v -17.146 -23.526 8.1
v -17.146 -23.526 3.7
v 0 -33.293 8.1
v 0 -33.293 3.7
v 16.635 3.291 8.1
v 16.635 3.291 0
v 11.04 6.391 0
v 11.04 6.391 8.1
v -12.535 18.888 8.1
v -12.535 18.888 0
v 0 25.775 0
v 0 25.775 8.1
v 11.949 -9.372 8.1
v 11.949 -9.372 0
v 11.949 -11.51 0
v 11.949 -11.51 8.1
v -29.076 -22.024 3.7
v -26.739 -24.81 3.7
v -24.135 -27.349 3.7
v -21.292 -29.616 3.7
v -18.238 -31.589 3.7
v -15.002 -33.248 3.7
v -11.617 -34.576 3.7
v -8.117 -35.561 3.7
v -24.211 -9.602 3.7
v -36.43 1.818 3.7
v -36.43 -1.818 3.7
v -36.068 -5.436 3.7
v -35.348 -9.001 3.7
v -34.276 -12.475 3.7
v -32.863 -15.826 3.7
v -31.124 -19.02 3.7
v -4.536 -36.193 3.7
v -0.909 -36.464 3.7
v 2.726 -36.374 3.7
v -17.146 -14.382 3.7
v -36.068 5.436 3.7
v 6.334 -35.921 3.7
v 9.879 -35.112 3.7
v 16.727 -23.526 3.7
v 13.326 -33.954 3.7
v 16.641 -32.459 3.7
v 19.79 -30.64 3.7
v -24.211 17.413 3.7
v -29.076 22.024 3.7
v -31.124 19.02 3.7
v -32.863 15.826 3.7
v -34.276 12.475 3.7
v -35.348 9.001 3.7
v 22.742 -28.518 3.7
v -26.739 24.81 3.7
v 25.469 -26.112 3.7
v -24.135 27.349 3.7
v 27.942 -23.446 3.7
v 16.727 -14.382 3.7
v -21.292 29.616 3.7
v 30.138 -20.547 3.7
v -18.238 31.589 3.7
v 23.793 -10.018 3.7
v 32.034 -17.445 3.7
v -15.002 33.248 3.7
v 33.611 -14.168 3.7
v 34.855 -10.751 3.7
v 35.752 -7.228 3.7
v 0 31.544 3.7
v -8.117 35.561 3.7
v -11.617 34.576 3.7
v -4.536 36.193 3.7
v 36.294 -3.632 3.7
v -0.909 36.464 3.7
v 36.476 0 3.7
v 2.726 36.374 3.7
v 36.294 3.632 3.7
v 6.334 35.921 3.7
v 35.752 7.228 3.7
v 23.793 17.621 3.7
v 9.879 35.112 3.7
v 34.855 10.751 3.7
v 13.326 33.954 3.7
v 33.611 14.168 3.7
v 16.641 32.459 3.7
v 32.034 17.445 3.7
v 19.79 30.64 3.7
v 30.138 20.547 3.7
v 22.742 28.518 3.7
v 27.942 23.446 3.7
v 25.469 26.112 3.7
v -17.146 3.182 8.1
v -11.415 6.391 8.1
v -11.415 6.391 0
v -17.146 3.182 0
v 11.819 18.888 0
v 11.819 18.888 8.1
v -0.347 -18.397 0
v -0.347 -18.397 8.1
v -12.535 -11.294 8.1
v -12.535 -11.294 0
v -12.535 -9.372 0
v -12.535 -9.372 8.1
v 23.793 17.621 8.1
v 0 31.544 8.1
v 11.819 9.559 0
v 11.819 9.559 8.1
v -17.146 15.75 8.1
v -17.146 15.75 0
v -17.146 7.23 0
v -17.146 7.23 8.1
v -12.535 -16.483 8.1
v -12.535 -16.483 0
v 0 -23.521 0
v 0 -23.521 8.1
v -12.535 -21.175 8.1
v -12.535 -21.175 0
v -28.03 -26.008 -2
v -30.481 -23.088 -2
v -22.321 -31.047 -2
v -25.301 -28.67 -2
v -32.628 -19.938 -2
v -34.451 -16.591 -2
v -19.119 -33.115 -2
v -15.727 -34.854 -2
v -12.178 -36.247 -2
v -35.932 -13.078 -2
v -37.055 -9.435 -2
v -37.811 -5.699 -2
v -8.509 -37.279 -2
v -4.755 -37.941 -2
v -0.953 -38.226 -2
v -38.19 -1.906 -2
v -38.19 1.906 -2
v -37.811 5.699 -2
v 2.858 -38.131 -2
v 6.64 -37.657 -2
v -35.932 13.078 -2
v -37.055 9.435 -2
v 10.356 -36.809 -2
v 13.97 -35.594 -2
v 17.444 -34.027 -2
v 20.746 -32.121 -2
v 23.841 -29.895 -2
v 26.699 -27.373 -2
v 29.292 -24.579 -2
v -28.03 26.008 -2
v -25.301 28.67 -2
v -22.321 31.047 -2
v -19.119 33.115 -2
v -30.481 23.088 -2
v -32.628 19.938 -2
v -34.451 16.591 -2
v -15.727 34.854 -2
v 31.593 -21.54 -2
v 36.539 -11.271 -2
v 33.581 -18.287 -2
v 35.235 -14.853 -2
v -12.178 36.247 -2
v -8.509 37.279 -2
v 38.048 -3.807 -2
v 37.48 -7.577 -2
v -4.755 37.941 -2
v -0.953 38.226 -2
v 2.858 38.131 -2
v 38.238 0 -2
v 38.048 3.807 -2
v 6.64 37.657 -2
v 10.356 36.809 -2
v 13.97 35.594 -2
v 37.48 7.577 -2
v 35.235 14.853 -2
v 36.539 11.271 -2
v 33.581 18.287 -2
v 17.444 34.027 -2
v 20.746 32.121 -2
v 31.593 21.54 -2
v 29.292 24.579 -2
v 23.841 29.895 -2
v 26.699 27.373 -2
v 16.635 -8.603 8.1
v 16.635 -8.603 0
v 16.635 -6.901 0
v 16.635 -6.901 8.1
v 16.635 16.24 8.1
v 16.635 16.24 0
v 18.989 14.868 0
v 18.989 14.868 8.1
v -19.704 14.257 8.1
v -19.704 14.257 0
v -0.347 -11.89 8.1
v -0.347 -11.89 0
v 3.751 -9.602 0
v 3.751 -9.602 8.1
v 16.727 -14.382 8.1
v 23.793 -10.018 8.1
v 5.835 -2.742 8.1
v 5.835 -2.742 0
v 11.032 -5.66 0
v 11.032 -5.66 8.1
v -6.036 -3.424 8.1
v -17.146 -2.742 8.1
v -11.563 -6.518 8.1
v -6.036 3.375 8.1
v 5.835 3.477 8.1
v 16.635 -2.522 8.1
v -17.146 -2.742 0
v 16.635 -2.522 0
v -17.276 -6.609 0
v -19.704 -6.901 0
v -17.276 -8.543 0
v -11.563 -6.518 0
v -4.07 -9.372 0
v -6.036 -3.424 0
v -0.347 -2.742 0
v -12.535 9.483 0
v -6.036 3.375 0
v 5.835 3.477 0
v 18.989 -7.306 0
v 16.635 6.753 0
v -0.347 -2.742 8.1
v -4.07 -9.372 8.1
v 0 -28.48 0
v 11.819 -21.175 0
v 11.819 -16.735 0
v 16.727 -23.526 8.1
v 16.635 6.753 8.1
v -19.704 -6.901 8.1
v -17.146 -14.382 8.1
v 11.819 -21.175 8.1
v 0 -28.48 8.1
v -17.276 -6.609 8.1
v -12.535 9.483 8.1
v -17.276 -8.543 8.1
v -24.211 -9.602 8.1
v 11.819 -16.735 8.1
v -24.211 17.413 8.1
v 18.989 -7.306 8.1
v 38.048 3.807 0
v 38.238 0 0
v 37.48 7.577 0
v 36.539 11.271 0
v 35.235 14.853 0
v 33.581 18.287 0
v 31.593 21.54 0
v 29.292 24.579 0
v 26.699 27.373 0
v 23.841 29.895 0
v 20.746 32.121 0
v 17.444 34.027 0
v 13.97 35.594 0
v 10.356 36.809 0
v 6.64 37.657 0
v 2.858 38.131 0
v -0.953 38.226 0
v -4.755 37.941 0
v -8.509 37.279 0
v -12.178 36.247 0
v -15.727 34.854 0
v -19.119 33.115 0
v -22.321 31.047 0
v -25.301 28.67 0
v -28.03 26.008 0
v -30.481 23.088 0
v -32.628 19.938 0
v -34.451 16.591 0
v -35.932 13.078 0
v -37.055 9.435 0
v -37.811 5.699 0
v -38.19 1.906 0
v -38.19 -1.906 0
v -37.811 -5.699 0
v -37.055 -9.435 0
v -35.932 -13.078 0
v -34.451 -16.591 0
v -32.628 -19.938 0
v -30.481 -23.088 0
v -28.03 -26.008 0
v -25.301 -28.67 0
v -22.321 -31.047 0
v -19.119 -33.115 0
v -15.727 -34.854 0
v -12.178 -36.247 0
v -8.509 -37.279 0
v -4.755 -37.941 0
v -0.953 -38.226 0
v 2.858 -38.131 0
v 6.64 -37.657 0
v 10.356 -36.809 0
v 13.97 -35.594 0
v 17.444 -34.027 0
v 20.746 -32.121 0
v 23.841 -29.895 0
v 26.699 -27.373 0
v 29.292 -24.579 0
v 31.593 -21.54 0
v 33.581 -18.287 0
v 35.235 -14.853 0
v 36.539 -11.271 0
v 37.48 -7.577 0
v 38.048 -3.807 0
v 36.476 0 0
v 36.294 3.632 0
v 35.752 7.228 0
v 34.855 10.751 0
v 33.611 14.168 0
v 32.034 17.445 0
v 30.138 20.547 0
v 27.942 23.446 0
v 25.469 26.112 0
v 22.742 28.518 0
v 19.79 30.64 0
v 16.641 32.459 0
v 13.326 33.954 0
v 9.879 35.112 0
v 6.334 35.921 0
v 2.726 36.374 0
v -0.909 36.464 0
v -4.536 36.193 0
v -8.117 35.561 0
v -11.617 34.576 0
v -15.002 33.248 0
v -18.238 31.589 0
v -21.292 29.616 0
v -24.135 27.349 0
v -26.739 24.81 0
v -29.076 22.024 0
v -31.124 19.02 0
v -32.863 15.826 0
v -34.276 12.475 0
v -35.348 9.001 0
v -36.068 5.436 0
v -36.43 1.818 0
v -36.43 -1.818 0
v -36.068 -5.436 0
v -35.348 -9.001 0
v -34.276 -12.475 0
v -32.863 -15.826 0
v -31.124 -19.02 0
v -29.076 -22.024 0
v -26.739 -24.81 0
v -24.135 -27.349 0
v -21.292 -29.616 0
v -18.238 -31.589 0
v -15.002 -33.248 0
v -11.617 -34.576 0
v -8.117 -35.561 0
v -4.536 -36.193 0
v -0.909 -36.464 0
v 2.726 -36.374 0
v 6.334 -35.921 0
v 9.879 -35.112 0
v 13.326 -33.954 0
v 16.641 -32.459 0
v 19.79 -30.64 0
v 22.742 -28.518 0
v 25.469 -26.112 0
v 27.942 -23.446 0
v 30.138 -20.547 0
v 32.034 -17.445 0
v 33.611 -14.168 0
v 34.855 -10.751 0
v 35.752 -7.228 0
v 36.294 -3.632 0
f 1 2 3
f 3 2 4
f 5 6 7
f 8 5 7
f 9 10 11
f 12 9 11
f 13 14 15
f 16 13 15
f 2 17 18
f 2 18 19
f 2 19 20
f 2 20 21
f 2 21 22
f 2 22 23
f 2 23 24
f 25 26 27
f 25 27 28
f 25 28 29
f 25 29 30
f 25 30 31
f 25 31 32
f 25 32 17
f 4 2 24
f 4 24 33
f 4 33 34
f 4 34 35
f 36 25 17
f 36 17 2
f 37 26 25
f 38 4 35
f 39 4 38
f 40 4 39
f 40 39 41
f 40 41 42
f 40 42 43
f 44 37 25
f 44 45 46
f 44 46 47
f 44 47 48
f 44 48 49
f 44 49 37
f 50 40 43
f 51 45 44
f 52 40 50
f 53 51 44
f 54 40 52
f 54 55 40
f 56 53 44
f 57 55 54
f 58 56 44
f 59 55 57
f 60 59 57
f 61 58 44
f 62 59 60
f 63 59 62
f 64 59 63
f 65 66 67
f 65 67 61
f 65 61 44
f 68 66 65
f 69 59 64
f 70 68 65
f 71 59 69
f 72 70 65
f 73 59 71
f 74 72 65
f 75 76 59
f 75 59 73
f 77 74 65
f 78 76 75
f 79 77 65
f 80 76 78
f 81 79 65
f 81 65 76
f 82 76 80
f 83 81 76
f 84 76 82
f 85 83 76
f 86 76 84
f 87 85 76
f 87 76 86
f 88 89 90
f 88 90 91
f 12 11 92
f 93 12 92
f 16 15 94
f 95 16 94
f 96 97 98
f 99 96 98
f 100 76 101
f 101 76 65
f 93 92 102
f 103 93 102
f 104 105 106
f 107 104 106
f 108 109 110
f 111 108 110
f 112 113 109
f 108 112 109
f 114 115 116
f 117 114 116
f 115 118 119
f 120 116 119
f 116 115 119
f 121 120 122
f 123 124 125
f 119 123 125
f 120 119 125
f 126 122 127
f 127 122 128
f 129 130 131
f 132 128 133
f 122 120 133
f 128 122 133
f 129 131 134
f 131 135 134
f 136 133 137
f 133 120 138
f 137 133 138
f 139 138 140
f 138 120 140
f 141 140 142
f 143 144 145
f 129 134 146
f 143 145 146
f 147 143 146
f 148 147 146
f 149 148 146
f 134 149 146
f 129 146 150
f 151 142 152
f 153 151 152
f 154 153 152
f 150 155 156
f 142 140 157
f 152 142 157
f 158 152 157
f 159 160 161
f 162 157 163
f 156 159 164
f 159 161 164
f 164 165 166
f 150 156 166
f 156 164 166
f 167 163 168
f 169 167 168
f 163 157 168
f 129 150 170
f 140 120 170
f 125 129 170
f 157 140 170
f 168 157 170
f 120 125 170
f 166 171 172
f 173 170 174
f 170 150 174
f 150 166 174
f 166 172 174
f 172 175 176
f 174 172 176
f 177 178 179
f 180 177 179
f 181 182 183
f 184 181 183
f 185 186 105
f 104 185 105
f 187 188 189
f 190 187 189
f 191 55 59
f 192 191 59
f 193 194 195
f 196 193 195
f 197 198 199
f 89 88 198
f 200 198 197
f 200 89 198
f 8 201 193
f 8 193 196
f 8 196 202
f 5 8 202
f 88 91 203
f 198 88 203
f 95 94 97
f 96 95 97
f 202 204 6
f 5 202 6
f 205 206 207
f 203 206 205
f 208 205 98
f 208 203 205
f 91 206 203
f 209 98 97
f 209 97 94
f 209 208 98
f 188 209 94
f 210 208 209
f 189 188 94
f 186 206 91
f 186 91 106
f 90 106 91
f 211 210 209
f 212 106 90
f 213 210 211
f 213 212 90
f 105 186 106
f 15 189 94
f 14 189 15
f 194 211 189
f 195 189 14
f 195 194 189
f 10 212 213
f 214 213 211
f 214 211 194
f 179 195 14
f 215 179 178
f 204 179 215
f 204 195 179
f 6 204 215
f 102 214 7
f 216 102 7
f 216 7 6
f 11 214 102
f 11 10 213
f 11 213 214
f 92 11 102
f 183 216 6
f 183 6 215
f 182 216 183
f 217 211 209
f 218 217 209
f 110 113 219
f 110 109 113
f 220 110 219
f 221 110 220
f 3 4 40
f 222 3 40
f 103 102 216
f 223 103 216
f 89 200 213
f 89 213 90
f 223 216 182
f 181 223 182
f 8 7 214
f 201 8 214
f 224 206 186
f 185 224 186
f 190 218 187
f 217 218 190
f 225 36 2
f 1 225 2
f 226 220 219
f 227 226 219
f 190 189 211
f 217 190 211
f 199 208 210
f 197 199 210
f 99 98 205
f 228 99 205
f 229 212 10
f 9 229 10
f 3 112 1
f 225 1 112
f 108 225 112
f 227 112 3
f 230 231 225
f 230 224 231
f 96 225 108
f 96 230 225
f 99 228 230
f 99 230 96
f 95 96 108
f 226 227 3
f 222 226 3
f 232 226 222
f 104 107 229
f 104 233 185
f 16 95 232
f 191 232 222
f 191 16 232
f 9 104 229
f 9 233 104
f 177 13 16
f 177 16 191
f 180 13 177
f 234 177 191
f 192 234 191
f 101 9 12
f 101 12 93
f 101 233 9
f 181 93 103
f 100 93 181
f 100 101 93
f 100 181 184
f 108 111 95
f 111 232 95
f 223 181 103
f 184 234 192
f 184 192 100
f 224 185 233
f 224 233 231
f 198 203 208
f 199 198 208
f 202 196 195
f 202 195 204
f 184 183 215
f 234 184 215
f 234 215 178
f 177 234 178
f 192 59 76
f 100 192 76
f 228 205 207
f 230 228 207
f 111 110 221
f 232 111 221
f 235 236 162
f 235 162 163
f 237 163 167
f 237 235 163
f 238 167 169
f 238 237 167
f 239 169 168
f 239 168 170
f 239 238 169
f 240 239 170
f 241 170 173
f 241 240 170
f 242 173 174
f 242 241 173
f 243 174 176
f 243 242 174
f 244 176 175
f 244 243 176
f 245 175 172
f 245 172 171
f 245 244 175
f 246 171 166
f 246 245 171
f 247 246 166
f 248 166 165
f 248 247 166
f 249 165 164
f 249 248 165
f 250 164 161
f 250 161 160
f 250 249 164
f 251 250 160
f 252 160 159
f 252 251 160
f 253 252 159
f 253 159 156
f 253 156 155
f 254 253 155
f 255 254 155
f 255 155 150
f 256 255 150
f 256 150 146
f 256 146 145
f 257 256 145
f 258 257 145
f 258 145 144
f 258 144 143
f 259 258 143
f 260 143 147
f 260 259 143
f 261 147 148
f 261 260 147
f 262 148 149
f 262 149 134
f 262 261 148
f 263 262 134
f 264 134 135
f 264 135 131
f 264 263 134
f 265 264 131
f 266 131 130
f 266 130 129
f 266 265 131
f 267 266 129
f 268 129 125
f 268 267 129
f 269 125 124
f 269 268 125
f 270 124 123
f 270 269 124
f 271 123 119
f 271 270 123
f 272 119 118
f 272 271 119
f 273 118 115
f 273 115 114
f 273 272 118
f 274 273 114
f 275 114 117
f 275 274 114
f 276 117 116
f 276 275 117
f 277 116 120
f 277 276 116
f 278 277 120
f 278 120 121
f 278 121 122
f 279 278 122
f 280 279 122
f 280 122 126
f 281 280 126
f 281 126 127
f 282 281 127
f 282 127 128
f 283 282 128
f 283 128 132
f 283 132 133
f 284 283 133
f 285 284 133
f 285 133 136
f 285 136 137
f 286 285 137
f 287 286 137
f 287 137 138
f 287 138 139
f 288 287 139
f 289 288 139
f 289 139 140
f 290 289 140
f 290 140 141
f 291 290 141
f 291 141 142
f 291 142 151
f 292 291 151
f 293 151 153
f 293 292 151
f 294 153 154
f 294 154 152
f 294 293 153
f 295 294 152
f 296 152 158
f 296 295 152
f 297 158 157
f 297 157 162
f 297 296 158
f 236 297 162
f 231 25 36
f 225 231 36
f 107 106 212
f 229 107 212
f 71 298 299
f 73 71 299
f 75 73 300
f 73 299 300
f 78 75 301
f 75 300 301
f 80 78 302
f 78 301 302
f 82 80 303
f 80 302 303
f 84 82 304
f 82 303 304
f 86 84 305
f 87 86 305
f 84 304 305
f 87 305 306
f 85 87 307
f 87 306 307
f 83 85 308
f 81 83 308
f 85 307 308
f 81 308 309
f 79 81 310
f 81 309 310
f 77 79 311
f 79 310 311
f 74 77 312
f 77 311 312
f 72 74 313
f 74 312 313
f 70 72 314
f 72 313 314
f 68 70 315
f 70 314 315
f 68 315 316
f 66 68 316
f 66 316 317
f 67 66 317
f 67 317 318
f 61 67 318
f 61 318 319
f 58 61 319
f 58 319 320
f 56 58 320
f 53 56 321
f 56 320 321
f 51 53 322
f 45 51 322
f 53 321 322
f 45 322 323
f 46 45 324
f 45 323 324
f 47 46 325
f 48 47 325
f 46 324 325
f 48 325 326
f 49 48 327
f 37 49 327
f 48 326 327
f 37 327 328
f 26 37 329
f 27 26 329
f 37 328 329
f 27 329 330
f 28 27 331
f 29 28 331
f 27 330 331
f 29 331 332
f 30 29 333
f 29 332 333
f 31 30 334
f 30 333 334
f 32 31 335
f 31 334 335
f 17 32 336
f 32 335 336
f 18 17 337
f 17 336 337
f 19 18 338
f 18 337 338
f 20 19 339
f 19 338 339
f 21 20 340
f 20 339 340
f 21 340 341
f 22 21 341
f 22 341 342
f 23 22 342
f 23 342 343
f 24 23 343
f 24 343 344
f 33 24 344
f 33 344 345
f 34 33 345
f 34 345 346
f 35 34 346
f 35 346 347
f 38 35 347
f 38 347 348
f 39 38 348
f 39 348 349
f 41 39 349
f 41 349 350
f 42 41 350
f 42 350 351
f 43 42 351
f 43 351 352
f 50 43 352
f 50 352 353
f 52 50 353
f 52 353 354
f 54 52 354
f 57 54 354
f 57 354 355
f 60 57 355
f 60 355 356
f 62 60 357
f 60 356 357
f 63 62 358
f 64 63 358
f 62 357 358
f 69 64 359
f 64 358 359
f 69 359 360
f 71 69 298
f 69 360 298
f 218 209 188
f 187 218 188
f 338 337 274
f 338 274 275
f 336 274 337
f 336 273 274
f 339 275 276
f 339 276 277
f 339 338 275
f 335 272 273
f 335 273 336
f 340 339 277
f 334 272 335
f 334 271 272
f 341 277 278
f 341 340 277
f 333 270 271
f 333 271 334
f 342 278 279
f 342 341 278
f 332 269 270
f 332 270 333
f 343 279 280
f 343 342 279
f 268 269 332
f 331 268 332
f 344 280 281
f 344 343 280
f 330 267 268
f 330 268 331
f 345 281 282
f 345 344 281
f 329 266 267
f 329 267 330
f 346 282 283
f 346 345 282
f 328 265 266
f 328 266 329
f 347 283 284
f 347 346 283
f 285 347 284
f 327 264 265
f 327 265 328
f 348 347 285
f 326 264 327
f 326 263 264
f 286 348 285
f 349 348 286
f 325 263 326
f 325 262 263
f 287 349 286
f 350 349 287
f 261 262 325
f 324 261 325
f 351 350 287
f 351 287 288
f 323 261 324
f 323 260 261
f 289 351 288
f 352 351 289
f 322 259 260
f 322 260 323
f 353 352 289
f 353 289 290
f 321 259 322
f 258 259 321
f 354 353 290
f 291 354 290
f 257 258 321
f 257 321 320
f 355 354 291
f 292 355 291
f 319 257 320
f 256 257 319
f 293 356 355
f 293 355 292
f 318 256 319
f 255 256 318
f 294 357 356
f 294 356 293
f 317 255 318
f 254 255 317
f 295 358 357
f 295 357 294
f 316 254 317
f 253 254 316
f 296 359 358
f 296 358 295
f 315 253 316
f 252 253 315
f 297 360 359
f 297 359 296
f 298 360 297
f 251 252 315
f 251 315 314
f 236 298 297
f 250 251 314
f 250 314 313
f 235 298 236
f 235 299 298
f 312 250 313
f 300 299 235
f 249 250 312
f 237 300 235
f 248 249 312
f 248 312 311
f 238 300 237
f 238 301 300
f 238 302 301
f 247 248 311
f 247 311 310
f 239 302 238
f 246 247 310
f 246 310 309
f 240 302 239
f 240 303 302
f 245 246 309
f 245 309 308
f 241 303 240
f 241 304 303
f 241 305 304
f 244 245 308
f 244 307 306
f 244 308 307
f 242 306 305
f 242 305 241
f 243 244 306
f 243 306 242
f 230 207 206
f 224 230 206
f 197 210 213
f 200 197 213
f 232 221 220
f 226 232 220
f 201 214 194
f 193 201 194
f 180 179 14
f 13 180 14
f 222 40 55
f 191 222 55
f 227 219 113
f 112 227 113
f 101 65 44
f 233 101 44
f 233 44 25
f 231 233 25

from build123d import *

# Parameters (mm, degrees)
F0_R     = 36.475604
F1_DEPTH = 3.7
F2_DEPTH = 8.1
F3_R     = 38.237687
F4_DEPTH = 2


with BuildPart() as f1:
    # F0 (on Top) → F1 (new body)
    with BuildSketch(Plane.XY):
        Circle(F0_R)
        Polygon((-24.211187, 17.412838), (0, 31.543903), (23.792868, 17.620649), (23.792868, -10.018051), (16.727336, -14.382056), (16.727336, -23.525685), (0, -33.292744), (-17.145654, -23.525685), (-17.145654, -14.382056), (-24.211187, -9.602431), align=None, mode=Mode.SUBTRACT)
    extrude(amount=F1_DEPTH)

    # F0 (on Top) → F2 (join)
    with BuildSketch(Plane.XY):
        Polygon((23.792868, 17.620649), (0, 31.543903), (-24.211187, 17.412838), (-24.211187, -9.602431), (-17.145654, -14.382056), (-17.145654, -23.525685), (0, -33.292744), (16.727336, -23.525685), (16.727336, -14.382056), (23.792868, -10.018051), align=None)
        Polygon((-12.534934, -21.175375), (-12.534934, -16.483145), (0, -23.52149), (11.818774, -16.734514), (11.818774, -21.175375), (0, -28.480387), align=None, mode=Mode.SUBTRACT)
        Polygon((-17.145654, 15.75036), (-17.145654, 7.23016), (-12.534934, 9.482956), (-12.534934, 18.887546), (0, 25.7752), (11.818774, 18.887546), (11.818774, 9.559093), (16.63455, 6.752592), (16.63455, 16.240098), (18.989254, 14.867842), (18.989254, -7.305608), (16.63455, -8.603099), (16.63455, -6.900904), (11.949172, -9.37198), (11.949172, -11.510435), (-0.347363, -18.396766), (-12.534934, -11.294187), (-12.534934, -9.37198), (-17.276361, -6.608808), (-17.276361, -8.542829), (-19.703554, -6.900904), (-19.703554, 14.25742), align=None, mode=Mode.SUBTRACT)
        Polygon((16.63455, 3.291251), (11.040321, 6.391475), (5.835399, 3.476604), (5.835399, -2.741615), (11.032363, -5.659703), (16.63455, -2.522355), align=None)
        Polygon((-6.036222, 3.375041), (-11.41535, 6.391475), (-17.145654, 3.182378), (-17.145654, -2.741615), (-11.562531, -6.518433), (-6.036222, -3.423579), align=None)
        Polygon((3.750607, -9.602431), (-0.347363, -2.741615), (-4.070303, -9.37198), (-0.347363, -11.890439), align=None)
    extrude(amount=F2_DEPTH)

    # F3 (on Top) → F4 (join)
    with BuildSketch(Plane.XY):
        Circle(F3_R)
    extrude(amount=-F4_DEPTH)


solid = f1.part
